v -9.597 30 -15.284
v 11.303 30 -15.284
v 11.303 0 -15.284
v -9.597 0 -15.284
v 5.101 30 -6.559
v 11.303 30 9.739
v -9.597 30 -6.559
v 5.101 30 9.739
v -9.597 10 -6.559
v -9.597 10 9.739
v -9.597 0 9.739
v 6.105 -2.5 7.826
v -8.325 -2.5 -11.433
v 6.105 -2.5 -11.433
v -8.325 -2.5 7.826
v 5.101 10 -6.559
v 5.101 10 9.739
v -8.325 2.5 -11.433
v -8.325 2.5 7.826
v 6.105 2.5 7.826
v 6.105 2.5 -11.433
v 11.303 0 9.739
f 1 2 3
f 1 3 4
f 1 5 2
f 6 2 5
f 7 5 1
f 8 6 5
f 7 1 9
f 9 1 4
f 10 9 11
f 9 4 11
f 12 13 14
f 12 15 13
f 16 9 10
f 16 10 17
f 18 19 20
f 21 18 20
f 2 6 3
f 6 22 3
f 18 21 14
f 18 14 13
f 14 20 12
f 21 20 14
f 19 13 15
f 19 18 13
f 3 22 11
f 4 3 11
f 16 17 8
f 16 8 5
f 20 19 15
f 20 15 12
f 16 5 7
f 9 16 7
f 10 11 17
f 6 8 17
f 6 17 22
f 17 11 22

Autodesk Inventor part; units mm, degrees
ref_plane "YZ Plane" through (0, 0, 0) normal (1, 0, 0) x (0, 1, 0)
ref_plane "XZ Plane" through (0, 0, 0) normal (0, 1, 0) x (-1, 0, 0)
ref_plane "XY Plane" through (0, 0, 0) normal (0, 0, 1) x (1, 0, 0)
sketch "Sketch1" plane through (0, 0, 0) normal (0, 1, 0) x (-1, 0, 0)
  line L0 (9.597, 9.7392) -> (-11.3031, 9.7392)
  line L1 (-11.3031, 9.7392) -> (-11.3031, -15.2841)
  line L2 (-11.3031, -15.2841) -> (9.597, -15.2841)
  line L3 (9.597, -15.2841) -> (9.597, 9.7392)
  point P0 (0, 0)
extrude "Extrusion1" add sketch "Sketch1" along normal blind 30
sketch "Sketch2" plane through (0, 30, 0) normal (0, 1, 0) x (1, 0, 0)
  line L0 (-9.597, -9.7392) -> (11.3031, -9.7392) projected
  line L1 (-9.597, -9.7392) -> (5.1013, -9.7392)
  line L2 (5.1013, -9.7392) -> (5.1013, 6.5588)
  line L3 (5.1013, 6.5588) -> (-9.597, 6.5588)
  line L4 (-9.597, 6.5588) -> (-9.597, -9.7392)
  point P0 (0, 0)
extrude "Extrusion2" cut sketch "Sketch2" against normal blind 20
sketch "Sketch4" plane through (0, 0, 0) normal (0, -1, 0) x (1, 0, 0)
  line L0 (6.1052, -11.4334) -> (-8.3253, -11.4334)
  line L1 (-8.3253, -11.4334) -> (-8.3253, 7.8258)
  line L2 (-8.3253, 7.8258) -> (6.1052, 7.8258)
  line L3 (6.1052, 7.8258) -> (6.1052, -11.4334)
  point P0 (0, 0)
extrude "Extrusion4" add sketch "Sketch4" along normal mid plane 5 separate body
properties part number "part_a"
